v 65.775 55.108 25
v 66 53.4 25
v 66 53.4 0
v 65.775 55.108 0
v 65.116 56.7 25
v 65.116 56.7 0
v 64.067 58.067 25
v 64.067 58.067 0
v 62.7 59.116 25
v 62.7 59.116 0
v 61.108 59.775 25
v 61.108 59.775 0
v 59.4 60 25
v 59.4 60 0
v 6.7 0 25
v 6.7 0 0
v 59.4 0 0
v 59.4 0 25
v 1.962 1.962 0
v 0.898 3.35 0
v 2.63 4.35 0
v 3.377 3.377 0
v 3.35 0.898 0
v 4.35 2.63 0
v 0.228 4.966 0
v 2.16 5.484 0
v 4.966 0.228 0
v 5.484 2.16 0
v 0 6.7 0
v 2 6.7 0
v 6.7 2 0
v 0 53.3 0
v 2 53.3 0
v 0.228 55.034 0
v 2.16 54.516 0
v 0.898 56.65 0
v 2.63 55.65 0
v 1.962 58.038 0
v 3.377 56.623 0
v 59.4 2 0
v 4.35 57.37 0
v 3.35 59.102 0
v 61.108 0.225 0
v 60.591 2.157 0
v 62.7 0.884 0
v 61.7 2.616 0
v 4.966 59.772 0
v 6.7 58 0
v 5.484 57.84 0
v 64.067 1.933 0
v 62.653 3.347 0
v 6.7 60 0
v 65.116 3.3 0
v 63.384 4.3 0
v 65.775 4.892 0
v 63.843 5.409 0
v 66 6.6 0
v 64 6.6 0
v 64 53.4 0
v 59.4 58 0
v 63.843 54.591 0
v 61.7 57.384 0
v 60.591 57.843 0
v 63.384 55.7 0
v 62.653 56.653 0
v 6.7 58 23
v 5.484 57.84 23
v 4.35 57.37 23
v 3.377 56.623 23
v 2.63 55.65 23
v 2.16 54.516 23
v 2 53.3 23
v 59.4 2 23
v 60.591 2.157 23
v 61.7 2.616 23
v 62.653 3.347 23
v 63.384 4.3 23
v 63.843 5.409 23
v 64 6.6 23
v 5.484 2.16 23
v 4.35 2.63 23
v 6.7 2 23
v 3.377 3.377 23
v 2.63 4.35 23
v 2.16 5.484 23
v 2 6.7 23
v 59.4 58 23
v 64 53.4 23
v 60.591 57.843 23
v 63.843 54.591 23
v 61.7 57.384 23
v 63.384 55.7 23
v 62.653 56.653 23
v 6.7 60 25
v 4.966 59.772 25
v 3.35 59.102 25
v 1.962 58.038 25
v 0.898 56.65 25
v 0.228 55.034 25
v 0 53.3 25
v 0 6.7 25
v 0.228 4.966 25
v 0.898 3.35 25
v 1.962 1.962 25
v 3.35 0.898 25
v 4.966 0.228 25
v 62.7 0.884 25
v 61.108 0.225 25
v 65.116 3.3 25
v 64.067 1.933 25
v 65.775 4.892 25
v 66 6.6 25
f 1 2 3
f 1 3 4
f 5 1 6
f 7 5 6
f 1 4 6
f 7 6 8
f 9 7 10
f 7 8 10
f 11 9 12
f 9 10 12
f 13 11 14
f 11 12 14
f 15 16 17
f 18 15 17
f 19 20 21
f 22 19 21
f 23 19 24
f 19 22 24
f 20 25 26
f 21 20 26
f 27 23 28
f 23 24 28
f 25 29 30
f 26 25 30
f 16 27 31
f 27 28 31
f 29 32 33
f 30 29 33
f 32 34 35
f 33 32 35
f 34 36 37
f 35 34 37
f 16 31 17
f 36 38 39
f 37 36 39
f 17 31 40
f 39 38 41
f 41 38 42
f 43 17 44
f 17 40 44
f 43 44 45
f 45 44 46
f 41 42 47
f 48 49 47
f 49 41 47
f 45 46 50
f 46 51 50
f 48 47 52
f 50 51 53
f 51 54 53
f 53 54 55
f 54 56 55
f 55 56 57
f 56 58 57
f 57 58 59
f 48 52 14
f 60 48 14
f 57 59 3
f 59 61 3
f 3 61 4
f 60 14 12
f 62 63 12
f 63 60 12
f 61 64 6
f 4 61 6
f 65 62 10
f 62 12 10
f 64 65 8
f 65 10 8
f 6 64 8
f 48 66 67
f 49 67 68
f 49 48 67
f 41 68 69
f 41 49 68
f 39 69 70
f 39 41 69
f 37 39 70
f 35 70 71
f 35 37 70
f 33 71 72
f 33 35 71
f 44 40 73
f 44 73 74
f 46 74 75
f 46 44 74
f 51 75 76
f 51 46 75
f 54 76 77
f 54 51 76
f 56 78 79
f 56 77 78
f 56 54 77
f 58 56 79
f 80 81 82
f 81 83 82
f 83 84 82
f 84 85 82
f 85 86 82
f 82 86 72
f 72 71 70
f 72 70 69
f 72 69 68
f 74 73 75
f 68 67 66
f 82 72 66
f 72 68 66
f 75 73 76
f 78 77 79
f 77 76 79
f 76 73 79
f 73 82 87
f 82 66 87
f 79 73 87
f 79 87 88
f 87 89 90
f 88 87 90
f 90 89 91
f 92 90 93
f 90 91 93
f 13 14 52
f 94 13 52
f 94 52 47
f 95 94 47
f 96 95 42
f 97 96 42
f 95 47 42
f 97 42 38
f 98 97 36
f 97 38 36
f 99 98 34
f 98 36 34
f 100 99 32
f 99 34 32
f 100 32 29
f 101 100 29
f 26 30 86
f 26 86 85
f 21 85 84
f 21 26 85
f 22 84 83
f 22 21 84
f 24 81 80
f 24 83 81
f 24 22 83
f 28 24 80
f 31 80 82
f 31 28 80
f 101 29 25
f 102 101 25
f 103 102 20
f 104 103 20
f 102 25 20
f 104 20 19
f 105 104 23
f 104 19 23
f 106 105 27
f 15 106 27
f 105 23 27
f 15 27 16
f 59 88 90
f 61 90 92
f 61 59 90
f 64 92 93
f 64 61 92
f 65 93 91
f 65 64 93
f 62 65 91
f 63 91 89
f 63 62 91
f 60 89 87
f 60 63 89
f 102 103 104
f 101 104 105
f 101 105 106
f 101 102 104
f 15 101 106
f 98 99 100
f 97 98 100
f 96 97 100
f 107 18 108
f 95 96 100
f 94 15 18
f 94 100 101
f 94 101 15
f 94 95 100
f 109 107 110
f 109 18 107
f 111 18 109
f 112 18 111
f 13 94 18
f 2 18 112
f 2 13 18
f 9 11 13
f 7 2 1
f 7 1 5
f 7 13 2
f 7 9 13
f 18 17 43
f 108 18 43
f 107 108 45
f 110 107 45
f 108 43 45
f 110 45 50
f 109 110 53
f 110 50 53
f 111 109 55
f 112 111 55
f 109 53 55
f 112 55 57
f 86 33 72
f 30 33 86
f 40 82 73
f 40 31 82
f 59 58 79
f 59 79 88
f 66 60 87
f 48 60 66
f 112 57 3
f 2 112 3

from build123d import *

# Parameters (mm, degrees)
EXTRUDE_DEPTH = 25
THICKNESS_T   = -2


with BuildPart() as part:
    # Sketch → Extrude (new body)
    with BuildSketch(Plane.XY):
        with BuildLine():
            Line((6.7, 0), (59.4, 0))
            ThreePointArc((59.4, 0), (64.066905, 1.933095), (66, 6.6))
            Line((66, 6.6), (66, 53.4))
            ThreePointArc((66, 53.4), (64.066905, 58.066905), (59.4, 60))
            Line((59.4, 60), (6.7, 60))
            ThreePointArc((6.7, 60), (1.962385, 58.037615), (0, 53.3))
            Line((0, 53.3), (0, 6.7))
            ThreePointArc((0, 6.7), (1.962385, 1.962385), (6.7, 0))
        make_face()
    extrude(amount=EXTRUDE_DEPTH)

    # Thickness
    thickness_openings = [part.faces().sort_by_distance(p)[0] for p in [
        (33.004479, 30, 0),
    ]]
    offset(amount=THICKNESS_T, openings=thickness_openings)


solid = part.part
